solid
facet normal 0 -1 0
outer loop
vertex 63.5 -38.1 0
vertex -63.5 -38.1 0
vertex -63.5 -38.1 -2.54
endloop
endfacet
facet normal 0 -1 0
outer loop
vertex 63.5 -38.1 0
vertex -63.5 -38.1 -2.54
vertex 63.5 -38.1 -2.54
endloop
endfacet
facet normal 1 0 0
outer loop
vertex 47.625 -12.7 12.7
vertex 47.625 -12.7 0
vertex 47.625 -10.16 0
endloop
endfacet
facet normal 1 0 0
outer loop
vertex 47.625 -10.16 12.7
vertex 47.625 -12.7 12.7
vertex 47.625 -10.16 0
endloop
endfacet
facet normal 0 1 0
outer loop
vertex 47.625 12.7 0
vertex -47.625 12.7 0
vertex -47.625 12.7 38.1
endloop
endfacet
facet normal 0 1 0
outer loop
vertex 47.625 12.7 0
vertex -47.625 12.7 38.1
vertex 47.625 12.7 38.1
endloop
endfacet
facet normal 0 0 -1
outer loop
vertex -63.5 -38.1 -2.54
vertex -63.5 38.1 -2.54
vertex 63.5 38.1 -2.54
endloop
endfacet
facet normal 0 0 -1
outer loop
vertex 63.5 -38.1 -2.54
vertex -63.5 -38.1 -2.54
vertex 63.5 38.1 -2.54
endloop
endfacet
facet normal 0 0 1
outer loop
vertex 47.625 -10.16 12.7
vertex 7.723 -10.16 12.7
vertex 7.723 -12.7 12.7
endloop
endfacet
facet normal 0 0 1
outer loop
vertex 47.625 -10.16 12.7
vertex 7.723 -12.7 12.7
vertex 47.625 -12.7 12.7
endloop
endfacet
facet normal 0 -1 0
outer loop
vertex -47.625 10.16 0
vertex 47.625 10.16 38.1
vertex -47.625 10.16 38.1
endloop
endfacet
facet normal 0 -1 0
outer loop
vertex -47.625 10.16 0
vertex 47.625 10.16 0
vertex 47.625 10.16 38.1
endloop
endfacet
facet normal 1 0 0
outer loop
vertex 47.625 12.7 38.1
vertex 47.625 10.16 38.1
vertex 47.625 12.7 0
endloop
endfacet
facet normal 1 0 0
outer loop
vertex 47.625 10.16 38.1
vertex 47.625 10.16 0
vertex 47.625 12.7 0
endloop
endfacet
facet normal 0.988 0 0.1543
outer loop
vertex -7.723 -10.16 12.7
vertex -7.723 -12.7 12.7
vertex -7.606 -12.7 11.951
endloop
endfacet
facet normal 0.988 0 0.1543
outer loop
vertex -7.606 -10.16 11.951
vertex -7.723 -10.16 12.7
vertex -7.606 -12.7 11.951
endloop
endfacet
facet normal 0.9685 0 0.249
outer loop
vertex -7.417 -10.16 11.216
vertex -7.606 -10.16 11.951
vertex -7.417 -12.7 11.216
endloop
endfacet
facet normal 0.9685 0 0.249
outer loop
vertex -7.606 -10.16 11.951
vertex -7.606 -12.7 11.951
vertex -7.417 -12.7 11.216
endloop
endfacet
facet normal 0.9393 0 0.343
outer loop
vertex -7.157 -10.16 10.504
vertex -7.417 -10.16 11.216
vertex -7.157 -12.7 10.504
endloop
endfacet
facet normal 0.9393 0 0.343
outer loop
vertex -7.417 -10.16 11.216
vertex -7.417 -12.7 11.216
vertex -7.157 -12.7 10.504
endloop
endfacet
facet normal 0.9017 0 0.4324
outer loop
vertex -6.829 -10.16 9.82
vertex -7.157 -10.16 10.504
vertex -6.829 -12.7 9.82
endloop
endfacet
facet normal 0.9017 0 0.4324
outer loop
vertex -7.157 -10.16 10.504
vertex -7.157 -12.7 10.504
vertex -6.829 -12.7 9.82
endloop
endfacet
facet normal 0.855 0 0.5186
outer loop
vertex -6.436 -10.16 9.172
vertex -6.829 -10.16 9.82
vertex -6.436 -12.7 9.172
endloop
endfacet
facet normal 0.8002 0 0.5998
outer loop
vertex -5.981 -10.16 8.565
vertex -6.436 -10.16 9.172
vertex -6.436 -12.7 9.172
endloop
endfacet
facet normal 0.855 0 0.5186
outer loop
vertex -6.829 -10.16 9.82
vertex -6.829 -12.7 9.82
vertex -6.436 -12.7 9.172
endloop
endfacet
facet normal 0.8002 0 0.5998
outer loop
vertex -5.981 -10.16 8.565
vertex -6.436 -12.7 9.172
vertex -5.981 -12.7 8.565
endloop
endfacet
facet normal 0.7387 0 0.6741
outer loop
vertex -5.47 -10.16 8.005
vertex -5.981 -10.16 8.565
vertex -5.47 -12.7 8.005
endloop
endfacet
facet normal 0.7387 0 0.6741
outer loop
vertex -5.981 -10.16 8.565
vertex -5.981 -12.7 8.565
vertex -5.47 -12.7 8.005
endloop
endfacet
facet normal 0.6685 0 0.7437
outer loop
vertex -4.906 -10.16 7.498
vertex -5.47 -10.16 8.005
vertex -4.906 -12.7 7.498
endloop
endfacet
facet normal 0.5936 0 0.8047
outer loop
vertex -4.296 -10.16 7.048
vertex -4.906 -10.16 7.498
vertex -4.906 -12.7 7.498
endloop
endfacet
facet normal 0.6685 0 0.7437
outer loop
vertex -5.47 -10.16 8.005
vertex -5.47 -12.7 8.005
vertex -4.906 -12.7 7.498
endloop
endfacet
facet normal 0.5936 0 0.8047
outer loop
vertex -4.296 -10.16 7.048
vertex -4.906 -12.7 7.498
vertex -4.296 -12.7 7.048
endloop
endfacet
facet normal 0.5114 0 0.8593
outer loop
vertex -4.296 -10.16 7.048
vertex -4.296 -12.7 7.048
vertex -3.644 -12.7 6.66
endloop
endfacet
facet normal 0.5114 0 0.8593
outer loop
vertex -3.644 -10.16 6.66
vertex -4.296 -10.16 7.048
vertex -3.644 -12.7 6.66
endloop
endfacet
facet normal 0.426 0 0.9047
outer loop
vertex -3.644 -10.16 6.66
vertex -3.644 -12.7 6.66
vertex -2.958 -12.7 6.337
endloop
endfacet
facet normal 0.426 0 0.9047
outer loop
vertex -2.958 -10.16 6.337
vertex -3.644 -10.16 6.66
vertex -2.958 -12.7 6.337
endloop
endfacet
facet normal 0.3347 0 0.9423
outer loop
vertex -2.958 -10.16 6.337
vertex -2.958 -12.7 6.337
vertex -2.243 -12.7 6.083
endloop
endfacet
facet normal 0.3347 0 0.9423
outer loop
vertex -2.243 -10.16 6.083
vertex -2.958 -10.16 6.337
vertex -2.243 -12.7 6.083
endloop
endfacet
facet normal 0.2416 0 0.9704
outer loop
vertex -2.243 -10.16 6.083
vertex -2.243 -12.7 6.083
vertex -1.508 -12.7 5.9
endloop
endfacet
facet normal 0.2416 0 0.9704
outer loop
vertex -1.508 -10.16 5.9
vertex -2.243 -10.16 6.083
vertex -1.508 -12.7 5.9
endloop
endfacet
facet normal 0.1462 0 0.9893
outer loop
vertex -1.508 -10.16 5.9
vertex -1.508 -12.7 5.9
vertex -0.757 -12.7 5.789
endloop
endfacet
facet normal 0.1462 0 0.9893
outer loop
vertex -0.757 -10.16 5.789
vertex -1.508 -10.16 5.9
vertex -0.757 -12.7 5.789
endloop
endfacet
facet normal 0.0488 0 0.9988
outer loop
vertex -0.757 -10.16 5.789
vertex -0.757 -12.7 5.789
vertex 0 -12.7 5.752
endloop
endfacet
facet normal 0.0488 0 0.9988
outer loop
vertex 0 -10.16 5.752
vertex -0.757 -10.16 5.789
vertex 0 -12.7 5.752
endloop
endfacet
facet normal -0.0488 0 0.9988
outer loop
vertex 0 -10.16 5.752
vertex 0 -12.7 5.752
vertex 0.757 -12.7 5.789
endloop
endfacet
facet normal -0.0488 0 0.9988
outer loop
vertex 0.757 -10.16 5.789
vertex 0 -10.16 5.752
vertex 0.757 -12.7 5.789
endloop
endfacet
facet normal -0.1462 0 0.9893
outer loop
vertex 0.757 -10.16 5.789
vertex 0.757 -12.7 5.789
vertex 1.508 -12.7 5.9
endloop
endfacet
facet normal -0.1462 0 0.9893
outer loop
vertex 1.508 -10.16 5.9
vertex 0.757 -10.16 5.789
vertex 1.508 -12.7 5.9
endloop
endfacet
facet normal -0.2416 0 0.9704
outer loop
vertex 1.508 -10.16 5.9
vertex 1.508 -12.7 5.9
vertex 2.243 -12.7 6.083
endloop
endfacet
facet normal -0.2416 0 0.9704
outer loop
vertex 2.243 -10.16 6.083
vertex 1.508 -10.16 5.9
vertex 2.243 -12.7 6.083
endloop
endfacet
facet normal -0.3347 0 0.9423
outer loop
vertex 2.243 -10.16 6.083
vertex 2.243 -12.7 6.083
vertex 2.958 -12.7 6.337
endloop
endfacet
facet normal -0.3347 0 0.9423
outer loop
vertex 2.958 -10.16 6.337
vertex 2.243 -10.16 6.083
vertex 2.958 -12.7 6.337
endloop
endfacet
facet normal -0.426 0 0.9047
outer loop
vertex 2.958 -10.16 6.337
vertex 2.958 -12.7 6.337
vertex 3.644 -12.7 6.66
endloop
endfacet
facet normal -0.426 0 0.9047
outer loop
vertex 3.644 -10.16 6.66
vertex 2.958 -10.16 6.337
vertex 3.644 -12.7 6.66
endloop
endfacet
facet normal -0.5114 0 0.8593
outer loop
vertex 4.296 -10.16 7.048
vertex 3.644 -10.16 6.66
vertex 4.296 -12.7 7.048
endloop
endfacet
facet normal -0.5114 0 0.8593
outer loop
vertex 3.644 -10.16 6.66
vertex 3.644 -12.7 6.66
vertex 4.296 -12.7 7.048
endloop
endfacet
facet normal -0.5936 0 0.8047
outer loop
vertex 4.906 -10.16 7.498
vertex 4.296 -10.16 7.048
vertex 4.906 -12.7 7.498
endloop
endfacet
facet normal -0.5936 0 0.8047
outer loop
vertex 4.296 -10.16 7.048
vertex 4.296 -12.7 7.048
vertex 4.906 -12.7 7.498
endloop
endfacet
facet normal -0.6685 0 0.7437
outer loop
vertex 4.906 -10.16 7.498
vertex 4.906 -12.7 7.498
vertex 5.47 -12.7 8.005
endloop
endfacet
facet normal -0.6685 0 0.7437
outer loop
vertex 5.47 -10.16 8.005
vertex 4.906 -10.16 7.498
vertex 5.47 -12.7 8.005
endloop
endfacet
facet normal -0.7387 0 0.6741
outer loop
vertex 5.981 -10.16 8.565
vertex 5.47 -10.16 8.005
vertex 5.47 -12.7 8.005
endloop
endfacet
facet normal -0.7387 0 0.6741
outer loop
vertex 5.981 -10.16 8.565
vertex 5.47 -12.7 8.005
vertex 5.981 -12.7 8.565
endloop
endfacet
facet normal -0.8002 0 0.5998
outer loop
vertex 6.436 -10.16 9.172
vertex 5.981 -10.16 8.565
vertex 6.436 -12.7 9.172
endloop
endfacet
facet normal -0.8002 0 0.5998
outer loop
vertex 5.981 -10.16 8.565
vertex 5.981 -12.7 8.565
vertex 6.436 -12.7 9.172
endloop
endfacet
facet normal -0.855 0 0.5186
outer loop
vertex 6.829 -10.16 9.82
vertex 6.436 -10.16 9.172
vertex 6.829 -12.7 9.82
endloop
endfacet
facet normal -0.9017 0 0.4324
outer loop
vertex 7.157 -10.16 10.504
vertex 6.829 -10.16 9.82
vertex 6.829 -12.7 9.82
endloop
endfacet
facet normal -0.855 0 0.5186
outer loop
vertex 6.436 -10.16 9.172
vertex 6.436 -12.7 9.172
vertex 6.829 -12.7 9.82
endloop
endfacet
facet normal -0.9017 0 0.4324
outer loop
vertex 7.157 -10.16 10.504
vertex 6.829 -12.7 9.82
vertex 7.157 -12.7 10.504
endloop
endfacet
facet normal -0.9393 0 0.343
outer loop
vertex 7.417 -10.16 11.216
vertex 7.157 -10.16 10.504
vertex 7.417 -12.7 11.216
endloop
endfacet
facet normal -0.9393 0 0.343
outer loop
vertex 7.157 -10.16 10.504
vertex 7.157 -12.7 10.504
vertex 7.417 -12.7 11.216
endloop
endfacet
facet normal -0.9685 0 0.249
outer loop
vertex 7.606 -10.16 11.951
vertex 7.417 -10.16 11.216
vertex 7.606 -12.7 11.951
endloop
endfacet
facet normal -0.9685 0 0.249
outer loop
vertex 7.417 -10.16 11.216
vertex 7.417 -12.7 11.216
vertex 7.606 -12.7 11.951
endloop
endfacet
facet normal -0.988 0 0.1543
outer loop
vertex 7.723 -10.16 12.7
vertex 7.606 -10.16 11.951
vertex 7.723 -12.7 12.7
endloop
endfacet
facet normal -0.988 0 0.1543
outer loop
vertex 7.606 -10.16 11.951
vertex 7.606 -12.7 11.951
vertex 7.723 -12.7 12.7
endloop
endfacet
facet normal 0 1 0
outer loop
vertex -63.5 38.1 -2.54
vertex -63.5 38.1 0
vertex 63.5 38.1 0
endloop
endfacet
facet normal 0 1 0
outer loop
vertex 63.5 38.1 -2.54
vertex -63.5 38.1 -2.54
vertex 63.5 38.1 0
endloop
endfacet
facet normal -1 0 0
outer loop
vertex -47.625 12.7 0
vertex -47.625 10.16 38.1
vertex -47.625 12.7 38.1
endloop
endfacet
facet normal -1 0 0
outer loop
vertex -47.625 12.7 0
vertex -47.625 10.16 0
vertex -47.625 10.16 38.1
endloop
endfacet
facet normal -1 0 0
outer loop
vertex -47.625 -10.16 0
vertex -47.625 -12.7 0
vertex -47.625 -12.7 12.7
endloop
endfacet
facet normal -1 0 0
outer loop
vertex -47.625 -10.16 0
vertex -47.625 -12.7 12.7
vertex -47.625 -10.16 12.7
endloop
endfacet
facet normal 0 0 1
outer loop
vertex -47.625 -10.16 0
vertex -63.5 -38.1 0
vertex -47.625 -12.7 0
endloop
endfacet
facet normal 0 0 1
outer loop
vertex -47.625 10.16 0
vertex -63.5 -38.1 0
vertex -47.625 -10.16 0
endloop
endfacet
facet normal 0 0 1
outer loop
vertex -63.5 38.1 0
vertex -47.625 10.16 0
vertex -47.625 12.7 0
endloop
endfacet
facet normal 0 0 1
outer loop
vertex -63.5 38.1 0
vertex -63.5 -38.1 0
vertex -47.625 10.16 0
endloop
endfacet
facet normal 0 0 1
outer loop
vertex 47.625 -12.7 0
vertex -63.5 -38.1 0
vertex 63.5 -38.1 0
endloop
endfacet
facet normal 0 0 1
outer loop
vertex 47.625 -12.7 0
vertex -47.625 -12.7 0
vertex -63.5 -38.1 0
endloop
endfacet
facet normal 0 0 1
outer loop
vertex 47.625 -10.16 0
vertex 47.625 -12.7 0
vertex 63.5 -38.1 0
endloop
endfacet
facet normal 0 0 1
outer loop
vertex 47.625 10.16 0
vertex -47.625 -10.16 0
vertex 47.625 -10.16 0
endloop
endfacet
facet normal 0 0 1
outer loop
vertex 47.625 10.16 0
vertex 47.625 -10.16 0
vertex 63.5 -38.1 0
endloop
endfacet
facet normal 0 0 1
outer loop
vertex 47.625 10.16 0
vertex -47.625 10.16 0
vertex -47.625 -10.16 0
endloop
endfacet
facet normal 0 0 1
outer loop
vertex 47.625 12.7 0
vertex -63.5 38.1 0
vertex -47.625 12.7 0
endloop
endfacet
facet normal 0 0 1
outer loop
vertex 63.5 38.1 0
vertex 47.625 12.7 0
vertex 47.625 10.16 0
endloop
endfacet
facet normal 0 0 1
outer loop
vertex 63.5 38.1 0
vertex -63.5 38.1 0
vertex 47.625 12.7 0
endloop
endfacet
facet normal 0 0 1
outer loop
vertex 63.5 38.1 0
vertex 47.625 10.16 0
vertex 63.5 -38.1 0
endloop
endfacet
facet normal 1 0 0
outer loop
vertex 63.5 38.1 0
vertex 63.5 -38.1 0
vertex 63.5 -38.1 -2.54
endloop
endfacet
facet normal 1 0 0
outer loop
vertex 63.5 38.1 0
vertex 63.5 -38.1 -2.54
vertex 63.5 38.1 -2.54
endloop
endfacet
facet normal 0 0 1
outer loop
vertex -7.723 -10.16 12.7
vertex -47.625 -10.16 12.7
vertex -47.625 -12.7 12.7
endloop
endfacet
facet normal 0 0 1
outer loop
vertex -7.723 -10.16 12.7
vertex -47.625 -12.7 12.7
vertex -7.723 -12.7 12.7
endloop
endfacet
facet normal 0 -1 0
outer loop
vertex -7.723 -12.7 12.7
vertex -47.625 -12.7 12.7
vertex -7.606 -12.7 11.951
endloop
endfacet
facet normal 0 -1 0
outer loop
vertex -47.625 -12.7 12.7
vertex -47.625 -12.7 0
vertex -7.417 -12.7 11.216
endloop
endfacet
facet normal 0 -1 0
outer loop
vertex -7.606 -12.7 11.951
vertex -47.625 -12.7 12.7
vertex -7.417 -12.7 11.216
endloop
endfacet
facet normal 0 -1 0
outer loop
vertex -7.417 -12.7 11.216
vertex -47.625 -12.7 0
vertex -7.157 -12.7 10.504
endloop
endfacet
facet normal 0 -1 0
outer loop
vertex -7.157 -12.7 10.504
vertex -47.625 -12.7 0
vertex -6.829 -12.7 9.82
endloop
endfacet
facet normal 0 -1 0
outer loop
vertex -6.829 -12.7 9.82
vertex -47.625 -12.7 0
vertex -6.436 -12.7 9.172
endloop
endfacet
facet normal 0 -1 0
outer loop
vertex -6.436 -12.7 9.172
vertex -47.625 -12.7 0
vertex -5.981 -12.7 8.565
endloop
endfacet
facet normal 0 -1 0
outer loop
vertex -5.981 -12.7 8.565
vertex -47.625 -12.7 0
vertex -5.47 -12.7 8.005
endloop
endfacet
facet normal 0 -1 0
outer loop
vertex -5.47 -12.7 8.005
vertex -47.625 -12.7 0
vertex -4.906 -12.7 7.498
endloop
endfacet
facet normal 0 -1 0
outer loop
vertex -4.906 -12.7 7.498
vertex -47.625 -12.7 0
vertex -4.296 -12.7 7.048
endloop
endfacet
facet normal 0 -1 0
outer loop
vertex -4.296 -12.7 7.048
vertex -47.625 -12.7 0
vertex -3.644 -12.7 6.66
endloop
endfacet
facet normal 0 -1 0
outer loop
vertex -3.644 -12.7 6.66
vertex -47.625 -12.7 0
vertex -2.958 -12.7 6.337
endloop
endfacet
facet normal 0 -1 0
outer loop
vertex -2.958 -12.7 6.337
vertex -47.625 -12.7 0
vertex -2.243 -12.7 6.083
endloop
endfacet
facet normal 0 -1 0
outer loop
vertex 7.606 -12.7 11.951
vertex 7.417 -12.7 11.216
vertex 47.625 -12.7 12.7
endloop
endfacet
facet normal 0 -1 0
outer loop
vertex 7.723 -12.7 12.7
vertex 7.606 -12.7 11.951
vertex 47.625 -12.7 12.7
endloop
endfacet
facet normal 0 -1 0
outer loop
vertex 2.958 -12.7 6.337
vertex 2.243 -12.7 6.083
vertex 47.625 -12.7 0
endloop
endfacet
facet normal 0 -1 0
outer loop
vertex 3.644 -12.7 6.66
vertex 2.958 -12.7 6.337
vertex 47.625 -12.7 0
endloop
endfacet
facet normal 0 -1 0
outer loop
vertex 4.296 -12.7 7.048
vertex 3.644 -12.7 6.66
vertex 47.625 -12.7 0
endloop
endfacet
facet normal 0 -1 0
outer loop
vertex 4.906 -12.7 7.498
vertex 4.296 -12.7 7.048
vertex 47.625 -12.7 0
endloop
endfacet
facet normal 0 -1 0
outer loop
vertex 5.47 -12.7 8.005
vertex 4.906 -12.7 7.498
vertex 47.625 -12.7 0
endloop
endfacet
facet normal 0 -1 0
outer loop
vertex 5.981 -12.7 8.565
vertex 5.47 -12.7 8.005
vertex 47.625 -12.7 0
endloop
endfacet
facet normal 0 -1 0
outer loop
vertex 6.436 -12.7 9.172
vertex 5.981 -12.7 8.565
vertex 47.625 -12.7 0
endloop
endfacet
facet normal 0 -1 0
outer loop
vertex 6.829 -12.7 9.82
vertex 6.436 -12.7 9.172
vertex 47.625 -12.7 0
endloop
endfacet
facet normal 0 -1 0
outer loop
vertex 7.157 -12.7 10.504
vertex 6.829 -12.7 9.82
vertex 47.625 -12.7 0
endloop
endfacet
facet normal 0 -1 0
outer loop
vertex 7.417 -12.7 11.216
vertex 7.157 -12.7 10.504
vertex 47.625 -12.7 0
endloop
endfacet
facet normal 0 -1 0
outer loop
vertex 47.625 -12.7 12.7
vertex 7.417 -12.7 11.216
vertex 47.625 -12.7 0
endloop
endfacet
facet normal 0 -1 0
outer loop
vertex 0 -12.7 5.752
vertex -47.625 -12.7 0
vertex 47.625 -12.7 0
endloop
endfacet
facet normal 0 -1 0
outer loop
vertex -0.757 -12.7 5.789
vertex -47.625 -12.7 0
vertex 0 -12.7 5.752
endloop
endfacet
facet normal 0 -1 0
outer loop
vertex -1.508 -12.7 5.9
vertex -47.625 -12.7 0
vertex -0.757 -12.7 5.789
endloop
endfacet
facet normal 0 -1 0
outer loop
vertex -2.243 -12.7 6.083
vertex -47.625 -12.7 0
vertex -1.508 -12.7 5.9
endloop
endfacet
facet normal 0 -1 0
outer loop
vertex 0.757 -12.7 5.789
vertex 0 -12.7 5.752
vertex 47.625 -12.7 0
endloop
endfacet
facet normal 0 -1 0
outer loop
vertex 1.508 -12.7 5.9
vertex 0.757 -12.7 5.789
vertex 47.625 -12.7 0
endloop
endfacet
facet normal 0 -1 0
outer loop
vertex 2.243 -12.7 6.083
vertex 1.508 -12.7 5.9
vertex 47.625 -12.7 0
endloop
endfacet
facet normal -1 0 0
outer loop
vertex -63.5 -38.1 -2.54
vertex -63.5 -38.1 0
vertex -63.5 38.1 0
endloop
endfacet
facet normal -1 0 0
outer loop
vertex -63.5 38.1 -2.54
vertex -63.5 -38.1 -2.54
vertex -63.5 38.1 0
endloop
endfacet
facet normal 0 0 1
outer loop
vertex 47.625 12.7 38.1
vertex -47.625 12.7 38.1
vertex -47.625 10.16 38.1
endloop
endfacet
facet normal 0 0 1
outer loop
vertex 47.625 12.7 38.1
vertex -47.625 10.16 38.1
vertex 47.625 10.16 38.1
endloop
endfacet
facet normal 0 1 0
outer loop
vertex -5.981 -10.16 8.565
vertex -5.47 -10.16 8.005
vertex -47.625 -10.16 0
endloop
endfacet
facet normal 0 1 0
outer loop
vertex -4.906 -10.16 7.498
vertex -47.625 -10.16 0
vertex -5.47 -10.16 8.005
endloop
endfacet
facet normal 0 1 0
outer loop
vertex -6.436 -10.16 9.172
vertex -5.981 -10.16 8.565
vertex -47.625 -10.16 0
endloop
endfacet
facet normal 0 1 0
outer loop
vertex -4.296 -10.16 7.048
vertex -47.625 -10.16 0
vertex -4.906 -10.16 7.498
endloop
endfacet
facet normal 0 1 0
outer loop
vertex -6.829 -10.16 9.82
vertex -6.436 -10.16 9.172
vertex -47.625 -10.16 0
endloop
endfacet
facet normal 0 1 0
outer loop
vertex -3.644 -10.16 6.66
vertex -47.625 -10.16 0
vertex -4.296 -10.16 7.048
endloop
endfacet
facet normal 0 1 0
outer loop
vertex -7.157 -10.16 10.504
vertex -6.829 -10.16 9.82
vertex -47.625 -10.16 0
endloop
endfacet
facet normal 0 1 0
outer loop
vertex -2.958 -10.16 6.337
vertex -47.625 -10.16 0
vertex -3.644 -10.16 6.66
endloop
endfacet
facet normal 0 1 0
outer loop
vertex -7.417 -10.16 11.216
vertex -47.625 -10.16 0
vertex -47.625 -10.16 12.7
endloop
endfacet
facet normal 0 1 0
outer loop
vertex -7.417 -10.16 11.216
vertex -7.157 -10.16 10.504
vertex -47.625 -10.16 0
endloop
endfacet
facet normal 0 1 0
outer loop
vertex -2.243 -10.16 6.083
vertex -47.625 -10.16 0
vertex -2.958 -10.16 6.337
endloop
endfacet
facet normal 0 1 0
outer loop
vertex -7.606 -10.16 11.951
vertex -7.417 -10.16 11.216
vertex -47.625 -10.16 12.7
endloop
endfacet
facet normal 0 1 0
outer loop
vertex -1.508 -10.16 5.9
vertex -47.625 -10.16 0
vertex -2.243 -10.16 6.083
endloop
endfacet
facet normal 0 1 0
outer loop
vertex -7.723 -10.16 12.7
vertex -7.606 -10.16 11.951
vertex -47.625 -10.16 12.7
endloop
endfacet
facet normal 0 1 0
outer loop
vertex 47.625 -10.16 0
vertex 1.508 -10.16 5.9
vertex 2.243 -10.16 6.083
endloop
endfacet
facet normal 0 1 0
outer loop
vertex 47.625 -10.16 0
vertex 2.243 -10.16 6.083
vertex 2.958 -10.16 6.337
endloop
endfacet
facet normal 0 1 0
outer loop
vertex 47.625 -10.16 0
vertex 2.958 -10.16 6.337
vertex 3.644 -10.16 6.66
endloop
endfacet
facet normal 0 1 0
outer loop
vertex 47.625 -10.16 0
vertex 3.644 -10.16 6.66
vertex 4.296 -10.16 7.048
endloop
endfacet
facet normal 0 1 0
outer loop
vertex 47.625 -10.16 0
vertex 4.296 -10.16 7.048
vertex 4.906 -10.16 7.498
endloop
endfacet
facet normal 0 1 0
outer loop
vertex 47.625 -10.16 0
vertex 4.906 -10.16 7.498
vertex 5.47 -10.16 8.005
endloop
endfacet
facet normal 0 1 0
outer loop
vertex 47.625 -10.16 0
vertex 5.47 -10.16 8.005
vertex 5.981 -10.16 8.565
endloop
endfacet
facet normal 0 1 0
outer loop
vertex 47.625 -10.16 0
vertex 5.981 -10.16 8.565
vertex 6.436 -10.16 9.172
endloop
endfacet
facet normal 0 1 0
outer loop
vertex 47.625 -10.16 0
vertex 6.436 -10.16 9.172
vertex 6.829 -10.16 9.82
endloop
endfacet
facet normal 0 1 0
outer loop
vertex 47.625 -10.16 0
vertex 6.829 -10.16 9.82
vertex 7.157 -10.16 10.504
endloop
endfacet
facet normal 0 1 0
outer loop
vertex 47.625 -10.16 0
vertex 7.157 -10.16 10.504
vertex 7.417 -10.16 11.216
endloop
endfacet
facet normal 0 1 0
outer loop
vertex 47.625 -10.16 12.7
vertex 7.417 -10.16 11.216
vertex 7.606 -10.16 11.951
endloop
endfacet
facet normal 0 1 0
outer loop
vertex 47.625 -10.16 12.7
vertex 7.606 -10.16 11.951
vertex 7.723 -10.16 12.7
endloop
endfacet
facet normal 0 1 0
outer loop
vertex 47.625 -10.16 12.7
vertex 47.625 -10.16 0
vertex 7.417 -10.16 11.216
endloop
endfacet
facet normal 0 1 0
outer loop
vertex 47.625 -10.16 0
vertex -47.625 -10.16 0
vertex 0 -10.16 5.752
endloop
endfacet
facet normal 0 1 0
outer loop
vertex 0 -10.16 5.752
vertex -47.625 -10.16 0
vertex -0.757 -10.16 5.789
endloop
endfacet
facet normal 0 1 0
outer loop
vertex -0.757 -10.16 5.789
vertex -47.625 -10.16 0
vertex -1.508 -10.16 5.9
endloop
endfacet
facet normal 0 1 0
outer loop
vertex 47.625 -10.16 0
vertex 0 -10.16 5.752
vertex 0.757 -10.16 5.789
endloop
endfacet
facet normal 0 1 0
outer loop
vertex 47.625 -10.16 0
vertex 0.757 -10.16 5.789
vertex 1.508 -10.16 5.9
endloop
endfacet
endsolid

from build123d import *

# Parameters (mm, degrees)
F0_W        = 95.25
F0_H        = 25.4
F1_DEPTH    = 12.7
F2_W        = 127
F2_H        = 76.2
F3_DEPTH    = 2.54
F4_T        = 2.54
F4_T3_DEPTH = 100.33
F4_T5_DEPTH = 30.48
F5_DEPTH    = 25.4
F6_DEPTH    = 25.4
F7_DEPTH    = 25.4
F10_DEPTH   = 5.08


# Not quite as in the source:
# - a shell that OpenCascade refuses in one call is made with other operations: the cavity is built on its own and cut out


with BuildPart() as f1:
    # F0 (on Top) → F1 (new body)
    with BuildSketch(Plane.XY):
        Rectangle(F0_W, F0_H)
    extrude(amount=F1_DEPTH)

    # F2 (on Top) → F3 (join)
    with BuildSketch(Plane.XY):
        Rectangle(F2_W, F2_H)
    extrude(amount=-F3_DEPTH)

    # F4: shell of thickness 2.54, made by hand


with BuildPart() as f4_core1:
    # F4_t2: copy of F1
    add(f1.part)

    # the walls: a layer under each face that stays
    f4_faces = [f4_core1.faces().sort_by_distance(p)[0] for p in [
        (63.5, 0, -1.27),
        (0, -38.1, -1.27),
        (0, 38.1, -1.27),
        (-42.3333333333, -25.4, 0),
        (0, 0, -2.54),
        (-63.5, 0, -1.27),
        (0, -12.7, 6.35),
        (47.625, 0, 6.35),
        (0, 12.7, 6.35),
        (-47.625, 0, 6.35),
    ]]
    thicken(f4_faces, amount=-F4_T, mode=Mode.SUBTRACT)

    # F4_s4 → F4_t3 (cut)
    with BuildSketch(Plane.YZ.offset(-50.165)):
        Polygon((-12.7254, 0.0254), (-12.7, -2.54), (-10.16, -2.54), (-10.16, 0), align=None)
        Polygon((12.7254, 0.0254), (12.7, -2.54), (10.16, -2.54), (10.16, 0), align=None)
    extrude(amount=F4_T3_DEPTH, mode=Mode.SUBTRACT)

    # F4_s6 → F4_t5 (cut)
    with BuildSketch(Plane.XZ.offset(-15.24)):
        Polygon((47.6504, 0.0254), (47.625, -2.54), (45.085, -2.54), (45.085, 0), align=None)
        Polygon((-47.6504, 0.0254), (-47.625, -2.54), (-45.085, -2.54), (-45.085, 0), align=None)
    extrude(amount=F4_T5_DEPTH, mode=Mode.SUBTRACT)


with BuildPart() as f1_1:
    add(f1.part)

    # what is left inside the walls is the cavity
    f4_cavity = [f4_core1.part.solids().sort_by_distance(p)[0] for p in [
        (0, -3.386667, 0.0254),
    ]]
    add(f4_cavity, mode=Mode.SUBTRACT)

    # F5 (cut): a face of the model
    f5_faces = [f1_1.faces().sort_by_distance(p)[0] for p in [
        (-45.085, 0, 6.35),
    ]]
    extrude(f5_faces, amount=-F5_DEPTH, mode=Mode.SUBTRACT)

    # F6 (cut): a face of the model
    f6_faces = [f1_1.faces().sort_by_distance(p)[0] for p in [
        (45.085, 0, 6.35),
    ]]
    extrude(f6_faces, amount=-F6_DEPTH, mode=Mode.SUBTRACT)

    # F7 (add): a face of the model
    f7_faces = [f1_1.faces().sort_by_distance(p)[0] for p in [
        (0, 11.43, 12.7),
    ]]
    extrude(f7_faces, amount=F7_DEPTH)

    # F9 (on face) → F10 (cut)
    with BuildSketch(Plane.XZ.offset(12.7)):
        with BuildLine():
            ThreePointArc((7.7229928646, 12.7), (7.7554155926, 13.1086234281), (7.7662332139, 13.5183883831))
            ThreePointArc((7.7662332139, 13.5183883831), (-0.409764955, 21.2738039757), (-7.7229928646, 12.7))
            Line((-7.7229928646, 12.7), (7.7229928646, 12.7))
        make_face()
        with BuildLine():
            Line((7.7229928646, 12.7), (-7.7229928646, 12.7))
            ThreePointArc((-7.7229928646, 12.7), (0, 5.7521551692), (7.7229928646, 12.7))
        make_face()
    extrude(amount=-F10_DEPTH, mode=Mode.SUBTRACT)


solid = f1_1.part
